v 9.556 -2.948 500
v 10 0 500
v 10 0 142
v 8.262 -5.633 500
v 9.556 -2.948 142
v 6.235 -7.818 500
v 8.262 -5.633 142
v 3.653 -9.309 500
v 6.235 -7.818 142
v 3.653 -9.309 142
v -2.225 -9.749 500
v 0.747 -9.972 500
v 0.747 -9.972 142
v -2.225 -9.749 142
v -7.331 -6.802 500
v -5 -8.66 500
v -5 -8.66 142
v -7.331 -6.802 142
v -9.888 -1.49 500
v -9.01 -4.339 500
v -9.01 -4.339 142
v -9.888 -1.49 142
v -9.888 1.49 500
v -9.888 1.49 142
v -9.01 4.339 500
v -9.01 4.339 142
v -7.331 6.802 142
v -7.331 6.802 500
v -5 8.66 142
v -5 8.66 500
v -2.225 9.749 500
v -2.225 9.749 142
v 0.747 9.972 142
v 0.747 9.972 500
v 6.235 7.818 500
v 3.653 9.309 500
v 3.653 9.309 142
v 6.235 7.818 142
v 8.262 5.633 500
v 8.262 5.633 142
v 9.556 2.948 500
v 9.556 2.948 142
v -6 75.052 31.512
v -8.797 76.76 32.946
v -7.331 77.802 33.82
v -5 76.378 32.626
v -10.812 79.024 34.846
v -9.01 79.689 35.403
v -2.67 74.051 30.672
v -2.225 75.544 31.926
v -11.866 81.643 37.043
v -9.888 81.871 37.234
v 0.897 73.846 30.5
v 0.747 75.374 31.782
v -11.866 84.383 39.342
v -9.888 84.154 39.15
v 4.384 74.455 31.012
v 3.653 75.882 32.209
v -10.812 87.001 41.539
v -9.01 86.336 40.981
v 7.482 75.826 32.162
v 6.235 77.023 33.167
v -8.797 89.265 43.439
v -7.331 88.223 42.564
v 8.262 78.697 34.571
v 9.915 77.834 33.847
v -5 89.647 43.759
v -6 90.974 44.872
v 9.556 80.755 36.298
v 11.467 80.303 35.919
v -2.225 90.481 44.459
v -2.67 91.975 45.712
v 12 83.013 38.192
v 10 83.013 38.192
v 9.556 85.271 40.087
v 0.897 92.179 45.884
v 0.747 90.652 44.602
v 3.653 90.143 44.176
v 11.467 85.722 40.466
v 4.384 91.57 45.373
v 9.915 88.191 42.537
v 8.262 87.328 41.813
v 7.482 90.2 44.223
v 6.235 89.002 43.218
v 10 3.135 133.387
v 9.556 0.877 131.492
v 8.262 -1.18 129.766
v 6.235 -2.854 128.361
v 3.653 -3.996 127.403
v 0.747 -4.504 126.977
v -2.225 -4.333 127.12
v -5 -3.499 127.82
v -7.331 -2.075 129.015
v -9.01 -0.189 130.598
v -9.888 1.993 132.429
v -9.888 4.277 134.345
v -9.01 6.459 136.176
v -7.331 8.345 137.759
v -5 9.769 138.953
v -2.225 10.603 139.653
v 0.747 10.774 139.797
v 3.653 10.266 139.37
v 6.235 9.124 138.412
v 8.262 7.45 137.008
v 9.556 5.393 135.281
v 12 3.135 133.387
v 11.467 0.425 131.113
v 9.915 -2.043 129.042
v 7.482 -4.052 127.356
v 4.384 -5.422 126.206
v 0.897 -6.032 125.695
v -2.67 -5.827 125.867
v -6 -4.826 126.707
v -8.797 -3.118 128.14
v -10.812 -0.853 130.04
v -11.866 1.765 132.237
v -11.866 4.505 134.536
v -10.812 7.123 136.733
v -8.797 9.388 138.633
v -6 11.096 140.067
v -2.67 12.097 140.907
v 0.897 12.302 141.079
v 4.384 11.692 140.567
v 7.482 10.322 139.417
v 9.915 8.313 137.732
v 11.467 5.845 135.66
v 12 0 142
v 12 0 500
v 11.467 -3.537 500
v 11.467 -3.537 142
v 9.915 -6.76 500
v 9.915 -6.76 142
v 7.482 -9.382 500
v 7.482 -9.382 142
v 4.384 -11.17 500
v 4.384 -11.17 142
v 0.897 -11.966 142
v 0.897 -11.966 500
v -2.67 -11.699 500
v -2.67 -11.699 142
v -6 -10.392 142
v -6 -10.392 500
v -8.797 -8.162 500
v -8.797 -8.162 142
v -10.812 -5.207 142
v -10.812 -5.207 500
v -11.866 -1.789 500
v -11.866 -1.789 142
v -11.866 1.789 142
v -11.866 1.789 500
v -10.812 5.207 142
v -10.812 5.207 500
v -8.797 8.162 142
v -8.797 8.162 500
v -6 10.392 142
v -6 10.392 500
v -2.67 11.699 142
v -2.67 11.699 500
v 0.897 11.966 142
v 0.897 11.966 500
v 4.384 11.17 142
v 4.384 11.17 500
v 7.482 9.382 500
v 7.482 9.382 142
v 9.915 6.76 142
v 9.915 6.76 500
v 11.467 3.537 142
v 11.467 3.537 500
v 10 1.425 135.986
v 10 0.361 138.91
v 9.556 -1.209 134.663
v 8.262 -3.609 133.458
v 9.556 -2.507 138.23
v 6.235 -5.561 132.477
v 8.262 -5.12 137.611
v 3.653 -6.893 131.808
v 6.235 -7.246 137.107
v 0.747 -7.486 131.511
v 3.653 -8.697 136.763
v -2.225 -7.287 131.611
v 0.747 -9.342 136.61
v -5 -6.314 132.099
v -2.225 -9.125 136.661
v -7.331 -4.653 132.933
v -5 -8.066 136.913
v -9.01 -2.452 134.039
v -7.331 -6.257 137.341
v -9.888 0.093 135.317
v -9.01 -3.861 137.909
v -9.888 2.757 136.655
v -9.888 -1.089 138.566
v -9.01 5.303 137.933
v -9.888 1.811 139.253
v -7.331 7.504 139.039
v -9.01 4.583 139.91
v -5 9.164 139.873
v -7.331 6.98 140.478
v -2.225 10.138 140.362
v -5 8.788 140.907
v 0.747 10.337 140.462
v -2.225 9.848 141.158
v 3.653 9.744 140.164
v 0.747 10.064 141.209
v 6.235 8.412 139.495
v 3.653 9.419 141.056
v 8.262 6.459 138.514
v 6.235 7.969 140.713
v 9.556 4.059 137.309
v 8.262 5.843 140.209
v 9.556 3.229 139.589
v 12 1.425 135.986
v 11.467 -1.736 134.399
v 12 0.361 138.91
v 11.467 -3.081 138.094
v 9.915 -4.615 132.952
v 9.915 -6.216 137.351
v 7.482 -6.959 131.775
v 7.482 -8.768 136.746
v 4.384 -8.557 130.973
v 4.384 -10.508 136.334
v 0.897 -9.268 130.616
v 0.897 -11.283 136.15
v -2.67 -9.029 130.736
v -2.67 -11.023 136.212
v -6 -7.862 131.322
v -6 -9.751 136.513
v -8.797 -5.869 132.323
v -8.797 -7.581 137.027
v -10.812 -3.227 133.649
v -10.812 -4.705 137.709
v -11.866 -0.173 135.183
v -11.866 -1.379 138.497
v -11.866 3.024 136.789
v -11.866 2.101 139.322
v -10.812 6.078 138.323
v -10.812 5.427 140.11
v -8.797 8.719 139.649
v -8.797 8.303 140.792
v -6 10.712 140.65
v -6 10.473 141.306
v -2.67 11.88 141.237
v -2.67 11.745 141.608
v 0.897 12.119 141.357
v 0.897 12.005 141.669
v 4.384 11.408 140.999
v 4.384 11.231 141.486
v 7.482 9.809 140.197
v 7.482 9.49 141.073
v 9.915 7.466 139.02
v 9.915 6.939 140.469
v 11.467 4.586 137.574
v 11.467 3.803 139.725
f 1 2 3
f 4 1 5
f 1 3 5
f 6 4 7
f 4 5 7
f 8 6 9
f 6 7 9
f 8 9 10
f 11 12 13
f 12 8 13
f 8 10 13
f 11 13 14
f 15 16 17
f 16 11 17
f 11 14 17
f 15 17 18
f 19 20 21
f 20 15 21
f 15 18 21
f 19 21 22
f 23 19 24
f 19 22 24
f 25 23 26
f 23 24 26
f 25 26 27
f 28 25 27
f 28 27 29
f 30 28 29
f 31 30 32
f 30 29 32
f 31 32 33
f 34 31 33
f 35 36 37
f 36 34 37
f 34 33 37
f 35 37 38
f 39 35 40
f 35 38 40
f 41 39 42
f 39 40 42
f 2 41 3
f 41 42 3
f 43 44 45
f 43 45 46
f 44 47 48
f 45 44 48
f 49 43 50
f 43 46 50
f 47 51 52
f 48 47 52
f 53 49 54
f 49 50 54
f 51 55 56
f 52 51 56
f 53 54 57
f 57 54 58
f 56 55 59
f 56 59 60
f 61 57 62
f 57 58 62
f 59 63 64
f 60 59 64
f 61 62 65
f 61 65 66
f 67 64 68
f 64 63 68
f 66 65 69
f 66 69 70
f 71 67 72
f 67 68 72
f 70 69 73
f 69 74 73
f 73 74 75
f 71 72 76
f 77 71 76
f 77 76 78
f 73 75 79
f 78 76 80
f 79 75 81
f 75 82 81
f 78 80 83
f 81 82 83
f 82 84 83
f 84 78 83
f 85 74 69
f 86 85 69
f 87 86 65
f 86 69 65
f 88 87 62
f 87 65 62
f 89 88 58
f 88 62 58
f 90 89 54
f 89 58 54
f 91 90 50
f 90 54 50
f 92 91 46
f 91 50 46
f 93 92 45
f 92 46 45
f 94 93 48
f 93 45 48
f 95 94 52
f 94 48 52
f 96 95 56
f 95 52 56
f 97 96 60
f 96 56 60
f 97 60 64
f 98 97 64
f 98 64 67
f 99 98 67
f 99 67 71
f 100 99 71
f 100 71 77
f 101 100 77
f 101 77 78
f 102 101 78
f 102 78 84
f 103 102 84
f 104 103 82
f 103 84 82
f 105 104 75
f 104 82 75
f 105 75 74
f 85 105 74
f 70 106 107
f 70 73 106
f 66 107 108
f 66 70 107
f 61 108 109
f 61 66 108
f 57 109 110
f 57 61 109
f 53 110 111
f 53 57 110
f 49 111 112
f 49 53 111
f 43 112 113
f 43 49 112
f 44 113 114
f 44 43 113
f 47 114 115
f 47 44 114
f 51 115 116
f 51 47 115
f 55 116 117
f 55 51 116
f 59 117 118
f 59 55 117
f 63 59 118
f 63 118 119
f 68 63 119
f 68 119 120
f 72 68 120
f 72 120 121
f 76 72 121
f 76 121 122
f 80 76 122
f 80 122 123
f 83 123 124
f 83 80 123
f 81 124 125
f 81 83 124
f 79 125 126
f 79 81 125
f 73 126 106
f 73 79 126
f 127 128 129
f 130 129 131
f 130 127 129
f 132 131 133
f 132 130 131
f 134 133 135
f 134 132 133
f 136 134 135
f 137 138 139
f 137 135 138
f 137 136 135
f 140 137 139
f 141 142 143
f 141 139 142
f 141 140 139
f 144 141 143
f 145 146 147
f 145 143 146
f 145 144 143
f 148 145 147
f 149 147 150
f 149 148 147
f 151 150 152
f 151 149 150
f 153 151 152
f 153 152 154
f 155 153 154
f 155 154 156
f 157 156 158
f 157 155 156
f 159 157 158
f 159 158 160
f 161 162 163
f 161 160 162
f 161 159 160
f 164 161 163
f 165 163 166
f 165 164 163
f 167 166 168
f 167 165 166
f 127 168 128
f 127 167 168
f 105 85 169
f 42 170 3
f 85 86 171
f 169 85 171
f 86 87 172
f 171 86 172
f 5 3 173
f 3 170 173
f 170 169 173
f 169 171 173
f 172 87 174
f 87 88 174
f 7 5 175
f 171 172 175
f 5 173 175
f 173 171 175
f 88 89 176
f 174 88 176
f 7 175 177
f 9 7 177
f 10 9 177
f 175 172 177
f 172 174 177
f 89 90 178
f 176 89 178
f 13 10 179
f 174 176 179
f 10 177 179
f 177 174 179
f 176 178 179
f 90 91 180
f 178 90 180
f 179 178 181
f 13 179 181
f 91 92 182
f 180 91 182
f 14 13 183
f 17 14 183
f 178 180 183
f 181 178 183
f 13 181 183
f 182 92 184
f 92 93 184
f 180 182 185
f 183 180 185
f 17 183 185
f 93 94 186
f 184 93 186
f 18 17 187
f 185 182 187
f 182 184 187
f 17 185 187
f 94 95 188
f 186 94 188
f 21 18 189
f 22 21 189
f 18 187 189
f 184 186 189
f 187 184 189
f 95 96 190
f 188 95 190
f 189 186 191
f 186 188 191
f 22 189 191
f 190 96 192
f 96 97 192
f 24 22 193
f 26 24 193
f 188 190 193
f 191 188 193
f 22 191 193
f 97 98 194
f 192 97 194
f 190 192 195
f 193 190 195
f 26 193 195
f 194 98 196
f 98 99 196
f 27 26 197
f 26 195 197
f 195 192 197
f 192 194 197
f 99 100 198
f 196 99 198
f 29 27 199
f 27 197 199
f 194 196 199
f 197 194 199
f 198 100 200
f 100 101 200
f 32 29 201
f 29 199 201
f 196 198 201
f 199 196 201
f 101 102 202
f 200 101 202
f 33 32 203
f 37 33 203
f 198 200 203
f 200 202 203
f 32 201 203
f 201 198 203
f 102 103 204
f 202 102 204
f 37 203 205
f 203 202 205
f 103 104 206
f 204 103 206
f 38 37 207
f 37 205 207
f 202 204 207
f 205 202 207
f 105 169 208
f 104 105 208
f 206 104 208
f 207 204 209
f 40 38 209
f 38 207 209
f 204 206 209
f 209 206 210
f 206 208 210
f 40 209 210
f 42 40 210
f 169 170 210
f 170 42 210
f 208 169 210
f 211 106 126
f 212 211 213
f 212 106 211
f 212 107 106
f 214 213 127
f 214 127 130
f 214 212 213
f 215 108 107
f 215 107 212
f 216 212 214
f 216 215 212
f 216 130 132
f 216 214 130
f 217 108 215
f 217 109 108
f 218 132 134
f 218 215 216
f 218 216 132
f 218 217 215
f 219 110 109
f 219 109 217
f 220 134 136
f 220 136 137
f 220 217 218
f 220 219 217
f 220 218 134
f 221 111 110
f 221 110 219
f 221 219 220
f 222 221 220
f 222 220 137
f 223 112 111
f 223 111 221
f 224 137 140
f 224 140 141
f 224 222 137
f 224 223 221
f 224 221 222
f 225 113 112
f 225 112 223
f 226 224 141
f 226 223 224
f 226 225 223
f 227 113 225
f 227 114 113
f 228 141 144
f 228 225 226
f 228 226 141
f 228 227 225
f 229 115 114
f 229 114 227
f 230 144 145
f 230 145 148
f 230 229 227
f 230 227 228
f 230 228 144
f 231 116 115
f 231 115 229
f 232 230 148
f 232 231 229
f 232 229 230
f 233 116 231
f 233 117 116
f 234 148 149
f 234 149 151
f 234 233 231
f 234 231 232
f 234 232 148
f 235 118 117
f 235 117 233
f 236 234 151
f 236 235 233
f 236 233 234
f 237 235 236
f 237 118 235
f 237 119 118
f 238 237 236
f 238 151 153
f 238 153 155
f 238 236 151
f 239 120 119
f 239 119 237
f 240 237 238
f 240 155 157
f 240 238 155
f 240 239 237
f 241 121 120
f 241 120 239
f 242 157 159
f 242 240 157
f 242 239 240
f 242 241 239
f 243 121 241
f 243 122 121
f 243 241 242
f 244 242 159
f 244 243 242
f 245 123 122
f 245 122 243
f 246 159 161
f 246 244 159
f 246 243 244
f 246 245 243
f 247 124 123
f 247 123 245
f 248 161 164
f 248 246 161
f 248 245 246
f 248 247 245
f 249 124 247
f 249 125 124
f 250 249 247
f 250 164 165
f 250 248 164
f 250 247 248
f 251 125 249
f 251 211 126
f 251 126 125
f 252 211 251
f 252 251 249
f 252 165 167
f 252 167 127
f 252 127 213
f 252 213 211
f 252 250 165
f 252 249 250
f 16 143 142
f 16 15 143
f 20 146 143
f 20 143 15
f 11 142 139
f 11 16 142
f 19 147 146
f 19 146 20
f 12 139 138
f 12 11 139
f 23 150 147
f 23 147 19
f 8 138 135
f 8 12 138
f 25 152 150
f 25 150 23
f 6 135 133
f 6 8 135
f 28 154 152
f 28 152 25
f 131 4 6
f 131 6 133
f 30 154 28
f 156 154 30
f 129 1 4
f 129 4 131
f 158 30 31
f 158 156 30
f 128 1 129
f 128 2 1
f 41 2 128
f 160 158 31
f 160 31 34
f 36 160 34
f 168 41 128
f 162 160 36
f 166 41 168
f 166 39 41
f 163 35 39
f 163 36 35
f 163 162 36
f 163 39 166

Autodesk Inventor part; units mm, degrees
ref_plane "YZ Plane" through (0, 0, 0) normal (1, 0, 0) x (0, 1, 0)
ref_plane "XY Plane" through (0, 0, 0) normal (0, 0, 1) x (1, 0, 0)
sketch "Sketch1" plane through (0, 0, 0) normal (0, 0, 1) x (1, 0, 0)
  circle A0 centre (0, 0) radius 12
  circle A1 centre (0, 0) radius 10
  dimension "d0" = 24
  dimension "d1" = 20
extrude "Extrusion1" add sketch "Sketch1" along normal blind 500
ref_plane "Work Plane1" through (0, -12, 0) normal (0, 1, 0) x (-1, 0, 0)
sketch "Sketch2" plane through (0, -12, 0) normal (0, 1, 0) x (-1, 0, 0)
  line L0 (-136.7178, 142) -> (138.1684, 142)
  line L1 (12, 0) -> (-12, 0) projected
  point P0 (0, 0)
  dimension "d4" = 142
bend part "Bend Part1" radius 25.4 angle 40 line through (136.7178, -12, 142) along (-1, 0, 0) centre toward (0, 1, 0) moving side (0, 0, -1) both sides no
properties part number "Sit Link 2"
